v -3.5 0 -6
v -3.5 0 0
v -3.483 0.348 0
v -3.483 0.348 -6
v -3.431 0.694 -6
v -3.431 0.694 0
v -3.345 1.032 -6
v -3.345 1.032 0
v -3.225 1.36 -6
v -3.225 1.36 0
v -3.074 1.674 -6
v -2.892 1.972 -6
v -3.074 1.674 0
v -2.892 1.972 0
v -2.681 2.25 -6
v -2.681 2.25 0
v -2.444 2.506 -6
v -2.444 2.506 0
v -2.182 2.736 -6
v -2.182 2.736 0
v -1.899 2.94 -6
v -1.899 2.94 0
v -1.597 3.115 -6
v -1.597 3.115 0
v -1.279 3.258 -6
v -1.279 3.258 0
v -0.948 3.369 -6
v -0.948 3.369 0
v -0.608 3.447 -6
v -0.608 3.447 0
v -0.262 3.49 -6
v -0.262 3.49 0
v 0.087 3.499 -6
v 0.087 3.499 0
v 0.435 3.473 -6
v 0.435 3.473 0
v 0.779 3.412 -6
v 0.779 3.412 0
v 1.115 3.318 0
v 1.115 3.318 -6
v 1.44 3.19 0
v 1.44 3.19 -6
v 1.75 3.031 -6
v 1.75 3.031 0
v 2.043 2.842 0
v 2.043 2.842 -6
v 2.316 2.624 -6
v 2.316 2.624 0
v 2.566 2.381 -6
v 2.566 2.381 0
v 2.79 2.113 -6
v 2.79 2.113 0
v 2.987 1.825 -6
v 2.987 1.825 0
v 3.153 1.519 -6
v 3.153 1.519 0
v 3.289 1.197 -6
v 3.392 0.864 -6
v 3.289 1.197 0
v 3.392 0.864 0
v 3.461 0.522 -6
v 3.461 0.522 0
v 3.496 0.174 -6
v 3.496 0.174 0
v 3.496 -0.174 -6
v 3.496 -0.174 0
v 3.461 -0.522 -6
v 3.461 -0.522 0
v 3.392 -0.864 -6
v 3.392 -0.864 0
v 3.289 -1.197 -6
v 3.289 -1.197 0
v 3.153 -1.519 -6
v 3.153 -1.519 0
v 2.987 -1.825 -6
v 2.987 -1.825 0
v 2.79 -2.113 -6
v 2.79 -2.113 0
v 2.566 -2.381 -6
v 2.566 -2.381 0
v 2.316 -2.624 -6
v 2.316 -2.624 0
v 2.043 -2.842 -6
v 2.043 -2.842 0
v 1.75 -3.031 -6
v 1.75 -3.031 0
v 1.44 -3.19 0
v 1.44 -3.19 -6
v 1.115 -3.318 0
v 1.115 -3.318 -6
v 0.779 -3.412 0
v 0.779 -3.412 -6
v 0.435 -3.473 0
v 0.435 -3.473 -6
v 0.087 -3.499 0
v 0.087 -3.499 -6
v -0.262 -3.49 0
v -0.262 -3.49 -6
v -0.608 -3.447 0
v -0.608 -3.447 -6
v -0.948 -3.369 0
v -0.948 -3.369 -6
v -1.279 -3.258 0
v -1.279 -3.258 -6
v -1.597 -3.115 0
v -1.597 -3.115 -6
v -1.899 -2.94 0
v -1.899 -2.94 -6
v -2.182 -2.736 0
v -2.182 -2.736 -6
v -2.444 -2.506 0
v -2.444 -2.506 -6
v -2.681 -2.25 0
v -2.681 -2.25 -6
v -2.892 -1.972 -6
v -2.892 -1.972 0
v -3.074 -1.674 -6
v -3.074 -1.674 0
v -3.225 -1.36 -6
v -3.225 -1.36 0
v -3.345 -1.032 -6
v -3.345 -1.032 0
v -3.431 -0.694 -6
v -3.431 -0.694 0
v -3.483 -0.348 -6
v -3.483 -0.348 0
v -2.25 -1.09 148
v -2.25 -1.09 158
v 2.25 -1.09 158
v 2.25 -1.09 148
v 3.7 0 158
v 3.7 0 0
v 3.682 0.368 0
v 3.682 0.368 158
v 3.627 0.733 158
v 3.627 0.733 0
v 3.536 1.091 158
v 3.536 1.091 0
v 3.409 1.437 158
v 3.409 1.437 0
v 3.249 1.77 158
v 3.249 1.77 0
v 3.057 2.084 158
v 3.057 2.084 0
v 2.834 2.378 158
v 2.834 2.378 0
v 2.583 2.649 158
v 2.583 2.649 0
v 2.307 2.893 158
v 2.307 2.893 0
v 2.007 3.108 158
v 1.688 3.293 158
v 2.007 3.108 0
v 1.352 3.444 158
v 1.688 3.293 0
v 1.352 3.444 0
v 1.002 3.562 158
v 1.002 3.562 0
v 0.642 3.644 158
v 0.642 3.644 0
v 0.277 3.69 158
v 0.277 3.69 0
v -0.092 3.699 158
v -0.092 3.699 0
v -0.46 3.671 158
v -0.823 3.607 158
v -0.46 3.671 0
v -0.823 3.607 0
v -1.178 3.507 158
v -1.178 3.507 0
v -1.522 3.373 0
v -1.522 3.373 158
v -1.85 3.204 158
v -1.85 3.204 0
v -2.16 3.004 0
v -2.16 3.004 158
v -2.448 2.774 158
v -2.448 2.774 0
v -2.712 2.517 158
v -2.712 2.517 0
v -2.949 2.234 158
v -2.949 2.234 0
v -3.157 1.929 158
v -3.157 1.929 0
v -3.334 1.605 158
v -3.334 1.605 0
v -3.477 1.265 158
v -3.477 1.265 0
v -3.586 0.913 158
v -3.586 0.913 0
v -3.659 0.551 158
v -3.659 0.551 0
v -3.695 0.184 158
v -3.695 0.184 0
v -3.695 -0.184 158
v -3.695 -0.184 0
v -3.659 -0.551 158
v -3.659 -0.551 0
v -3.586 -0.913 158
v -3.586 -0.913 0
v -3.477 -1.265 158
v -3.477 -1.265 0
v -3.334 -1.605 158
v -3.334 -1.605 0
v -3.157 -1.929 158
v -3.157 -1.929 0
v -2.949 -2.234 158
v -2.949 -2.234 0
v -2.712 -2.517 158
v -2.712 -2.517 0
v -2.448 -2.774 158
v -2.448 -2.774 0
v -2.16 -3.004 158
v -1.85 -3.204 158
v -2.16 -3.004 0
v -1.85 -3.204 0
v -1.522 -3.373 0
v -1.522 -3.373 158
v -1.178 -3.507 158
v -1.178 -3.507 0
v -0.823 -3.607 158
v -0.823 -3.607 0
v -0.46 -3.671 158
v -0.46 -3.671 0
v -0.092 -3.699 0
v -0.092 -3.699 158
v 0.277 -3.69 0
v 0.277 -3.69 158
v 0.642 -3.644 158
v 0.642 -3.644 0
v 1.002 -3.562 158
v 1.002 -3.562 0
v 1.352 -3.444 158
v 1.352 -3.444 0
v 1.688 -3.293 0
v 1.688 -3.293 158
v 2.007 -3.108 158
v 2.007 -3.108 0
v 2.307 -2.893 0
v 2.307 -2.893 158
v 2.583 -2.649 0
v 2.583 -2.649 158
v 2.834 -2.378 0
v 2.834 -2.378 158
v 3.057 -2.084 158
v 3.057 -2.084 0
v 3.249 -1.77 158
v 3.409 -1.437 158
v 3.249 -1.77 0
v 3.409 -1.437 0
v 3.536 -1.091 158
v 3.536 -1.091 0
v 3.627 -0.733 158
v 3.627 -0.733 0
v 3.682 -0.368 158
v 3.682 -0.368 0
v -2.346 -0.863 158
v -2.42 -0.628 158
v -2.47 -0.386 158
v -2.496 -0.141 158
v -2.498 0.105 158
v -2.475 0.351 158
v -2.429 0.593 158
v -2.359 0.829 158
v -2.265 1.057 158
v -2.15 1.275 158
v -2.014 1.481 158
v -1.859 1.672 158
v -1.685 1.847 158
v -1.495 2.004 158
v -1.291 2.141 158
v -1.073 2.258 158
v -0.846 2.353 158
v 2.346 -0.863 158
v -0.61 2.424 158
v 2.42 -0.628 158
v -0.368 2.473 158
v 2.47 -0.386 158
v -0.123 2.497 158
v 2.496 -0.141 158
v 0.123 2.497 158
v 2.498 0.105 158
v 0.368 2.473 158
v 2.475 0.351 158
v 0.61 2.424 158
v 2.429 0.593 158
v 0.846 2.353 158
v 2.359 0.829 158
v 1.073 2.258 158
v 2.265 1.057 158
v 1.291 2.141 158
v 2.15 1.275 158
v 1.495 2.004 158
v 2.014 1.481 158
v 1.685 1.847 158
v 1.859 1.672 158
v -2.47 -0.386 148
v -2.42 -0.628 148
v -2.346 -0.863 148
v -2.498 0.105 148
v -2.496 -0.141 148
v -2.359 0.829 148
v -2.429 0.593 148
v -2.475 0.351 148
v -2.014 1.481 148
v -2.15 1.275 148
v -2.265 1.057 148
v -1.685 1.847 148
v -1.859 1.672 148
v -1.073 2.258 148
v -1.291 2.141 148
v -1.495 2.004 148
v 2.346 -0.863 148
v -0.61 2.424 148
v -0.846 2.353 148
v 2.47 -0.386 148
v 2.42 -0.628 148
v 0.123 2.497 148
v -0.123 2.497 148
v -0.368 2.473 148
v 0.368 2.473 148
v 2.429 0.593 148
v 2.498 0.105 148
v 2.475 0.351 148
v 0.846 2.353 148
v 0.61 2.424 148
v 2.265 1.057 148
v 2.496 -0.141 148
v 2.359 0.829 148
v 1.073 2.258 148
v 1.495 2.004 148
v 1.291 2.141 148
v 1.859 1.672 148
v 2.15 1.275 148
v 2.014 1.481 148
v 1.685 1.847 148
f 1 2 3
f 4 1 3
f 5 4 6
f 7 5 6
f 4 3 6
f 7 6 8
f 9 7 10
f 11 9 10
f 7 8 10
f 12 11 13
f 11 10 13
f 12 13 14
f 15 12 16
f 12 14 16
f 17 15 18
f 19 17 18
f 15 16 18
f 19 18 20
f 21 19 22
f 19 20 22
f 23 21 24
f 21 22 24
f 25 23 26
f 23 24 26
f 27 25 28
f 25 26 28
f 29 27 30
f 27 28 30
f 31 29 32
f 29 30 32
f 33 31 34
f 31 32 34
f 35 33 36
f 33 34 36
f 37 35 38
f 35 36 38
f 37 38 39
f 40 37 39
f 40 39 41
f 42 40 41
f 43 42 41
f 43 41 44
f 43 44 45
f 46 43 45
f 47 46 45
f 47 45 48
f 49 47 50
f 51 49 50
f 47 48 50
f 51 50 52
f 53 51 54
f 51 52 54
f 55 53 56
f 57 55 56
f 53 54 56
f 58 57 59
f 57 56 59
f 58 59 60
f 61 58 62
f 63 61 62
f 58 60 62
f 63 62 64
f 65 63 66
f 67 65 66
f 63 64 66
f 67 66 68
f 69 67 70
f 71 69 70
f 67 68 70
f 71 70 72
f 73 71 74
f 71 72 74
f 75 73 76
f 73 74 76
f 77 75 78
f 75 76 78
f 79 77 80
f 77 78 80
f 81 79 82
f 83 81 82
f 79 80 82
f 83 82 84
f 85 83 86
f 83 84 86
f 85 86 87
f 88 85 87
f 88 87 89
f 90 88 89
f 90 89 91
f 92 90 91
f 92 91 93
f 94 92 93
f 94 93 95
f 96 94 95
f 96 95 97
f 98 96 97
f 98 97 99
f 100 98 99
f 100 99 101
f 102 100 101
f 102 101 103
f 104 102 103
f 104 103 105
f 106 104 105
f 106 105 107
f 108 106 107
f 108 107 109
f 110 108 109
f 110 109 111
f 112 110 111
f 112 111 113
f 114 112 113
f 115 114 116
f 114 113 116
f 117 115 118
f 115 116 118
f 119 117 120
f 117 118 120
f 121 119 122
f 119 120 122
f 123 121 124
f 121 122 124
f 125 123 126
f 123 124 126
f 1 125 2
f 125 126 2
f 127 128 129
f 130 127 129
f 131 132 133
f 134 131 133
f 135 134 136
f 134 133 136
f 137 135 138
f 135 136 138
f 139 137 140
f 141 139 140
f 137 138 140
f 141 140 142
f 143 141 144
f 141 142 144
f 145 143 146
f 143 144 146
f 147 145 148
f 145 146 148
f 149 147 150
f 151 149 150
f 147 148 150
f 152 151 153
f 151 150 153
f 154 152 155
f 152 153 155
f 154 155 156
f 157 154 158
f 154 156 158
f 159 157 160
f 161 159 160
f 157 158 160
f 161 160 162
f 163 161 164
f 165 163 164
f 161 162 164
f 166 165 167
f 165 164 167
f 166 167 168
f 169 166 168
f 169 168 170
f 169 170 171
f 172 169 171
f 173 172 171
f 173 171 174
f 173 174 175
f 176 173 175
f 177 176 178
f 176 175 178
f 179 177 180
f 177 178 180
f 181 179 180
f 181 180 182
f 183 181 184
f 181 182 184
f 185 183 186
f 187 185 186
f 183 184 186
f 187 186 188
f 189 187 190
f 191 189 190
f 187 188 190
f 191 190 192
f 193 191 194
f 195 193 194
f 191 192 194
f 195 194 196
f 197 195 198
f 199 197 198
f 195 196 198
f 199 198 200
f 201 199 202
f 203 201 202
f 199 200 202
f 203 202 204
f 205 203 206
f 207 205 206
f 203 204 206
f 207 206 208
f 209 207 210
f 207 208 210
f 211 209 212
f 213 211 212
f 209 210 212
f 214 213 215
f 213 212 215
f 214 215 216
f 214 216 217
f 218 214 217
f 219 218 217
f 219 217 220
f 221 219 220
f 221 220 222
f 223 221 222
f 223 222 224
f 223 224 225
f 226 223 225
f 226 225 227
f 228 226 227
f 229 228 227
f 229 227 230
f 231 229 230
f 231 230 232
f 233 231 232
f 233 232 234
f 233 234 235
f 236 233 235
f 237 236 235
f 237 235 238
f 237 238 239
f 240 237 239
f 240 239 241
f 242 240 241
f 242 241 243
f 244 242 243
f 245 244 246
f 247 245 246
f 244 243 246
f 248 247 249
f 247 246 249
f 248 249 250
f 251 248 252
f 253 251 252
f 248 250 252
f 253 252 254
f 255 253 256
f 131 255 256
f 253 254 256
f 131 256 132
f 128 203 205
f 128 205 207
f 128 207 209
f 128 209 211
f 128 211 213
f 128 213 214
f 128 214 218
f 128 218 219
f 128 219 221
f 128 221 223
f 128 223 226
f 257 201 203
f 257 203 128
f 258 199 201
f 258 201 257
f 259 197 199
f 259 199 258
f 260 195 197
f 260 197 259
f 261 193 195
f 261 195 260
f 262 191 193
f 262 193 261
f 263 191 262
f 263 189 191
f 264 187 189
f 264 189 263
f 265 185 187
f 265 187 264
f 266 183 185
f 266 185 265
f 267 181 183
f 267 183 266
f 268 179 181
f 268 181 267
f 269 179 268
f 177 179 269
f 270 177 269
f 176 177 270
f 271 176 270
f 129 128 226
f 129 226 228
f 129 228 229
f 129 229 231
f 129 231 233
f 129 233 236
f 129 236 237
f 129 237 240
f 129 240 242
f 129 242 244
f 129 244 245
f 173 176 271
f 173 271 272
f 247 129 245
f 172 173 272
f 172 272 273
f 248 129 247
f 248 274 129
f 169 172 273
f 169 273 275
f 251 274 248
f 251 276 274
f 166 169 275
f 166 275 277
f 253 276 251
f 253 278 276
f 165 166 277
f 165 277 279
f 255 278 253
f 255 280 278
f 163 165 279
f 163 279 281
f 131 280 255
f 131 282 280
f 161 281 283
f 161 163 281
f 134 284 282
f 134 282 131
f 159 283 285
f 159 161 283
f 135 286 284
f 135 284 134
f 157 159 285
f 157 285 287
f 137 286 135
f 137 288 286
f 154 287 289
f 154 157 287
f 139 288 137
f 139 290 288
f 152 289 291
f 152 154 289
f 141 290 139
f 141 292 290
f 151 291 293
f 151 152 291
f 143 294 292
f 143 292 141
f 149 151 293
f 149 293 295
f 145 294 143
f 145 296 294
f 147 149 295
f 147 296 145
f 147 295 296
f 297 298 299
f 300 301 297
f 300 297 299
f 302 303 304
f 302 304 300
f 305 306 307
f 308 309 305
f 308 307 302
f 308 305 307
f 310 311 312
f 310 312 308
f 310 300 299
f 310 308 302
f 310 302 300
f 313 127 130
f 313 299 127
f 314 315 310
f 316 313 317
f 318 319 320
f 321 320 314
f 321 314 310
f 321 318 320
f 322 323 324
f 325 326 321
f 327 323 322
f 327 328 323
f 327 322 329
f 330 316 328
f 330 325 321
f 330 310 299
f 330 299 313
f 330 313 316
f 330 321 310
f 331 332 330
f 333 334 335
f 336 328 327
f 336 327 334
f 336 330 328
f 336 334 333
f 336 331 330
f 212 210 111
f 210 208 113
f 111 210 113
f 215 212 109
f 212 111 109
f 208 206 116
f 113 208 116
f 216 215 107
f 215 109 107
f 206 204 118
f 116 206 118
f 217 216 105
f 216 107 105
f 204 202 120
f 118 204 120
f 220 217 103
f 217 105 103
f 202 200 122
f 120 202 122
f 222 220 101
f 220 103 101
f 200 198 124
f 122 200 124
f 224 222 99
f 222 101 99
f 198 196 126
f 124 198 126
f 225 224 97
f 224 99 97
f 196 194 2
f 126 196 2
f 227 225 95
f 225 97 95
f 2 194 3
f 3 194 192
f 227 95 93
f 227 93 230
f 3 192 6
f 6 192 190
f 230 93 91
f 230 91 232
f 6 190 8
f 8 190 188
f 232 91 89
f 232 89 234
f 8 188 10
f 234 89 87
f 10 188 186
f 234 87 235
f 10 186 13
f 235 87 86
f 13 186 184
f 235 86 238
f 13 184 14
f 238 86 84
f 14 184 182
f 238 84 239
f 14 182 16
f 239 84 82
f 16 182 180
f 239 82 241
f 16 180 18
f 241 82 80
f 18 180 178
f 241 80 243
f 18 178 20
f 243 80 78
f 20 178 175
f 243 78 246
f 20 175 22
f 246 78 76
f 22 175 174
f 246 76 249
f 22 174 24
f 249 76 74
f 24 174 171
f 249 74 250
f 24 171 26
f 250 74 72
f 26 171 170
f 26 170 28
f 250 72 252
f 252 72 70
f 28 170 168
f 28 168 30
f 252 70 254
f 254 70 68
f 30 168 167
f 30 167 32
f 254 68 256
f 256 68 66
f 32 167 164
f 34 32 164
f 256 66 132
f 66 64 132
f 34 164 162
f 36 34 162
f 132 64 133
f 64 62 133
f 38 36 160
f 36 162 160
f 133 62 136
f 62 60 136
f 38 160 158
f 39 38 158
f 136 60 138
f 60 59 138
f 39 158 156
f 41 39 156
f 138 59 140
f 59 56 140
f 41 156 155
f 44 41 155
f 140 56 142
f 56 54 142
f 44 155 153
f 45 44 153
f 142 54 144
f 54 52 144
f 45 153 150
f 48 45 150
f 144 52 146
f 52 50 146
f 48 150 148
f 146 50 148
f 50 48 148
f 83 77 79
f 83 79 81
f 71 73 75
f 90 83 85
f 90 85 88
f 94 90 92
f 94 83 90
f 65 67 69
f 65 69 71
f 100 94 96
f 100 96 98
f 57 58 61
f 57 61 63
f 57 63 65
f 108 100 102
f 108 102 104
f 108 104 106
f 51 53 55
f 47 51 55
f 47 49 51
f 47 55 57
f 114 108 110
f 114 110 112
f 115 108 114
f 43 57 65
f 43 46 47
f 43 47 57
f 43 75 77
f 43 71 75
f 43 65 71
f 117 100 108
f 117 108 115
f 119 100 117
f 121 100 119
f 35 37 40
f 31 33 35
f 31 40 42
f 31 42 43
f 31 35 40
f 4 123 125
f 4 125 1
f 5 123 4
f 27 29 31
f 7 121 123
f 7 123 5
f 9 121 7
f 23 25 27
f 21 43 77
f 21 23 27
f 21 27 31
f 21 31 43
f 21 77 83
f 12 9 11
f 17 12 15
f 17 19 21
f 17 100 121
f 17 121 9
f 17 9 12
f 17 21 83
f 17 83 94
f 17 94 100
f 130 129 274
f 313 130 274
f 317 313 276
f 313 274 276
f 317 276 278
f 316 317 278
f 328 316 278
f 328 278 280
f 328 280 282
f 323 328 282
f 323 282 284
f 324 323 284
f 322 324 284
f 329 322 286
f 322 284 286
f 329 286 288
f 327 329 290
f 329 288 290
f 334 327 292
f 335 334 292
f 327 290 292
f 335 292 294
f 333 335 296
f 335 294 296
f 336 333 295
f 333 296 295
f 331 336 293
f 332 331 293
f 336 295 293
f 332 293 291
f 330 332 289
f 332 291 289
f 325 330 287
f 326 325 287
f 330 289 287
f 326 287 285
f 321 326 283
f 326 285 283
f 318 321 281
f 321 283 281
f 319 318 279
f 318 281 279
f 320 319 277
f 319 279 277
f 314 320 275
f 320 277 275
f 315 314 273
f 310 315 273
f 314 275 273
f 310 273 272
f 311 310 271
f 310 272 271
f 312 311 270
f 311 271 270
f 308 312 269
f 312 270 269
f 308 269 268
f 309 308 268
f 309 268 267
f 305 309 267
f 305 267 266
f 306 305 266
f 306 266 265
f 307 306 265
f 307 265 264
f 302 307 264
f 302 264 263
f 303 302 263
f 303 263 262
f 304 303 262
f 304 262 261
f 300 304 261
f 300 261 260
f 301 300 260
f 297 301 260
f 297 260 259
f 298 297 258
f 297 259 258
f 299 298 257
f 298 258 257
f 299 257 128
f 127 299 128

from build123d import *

# Parameters (mm, degrees)
SKETCH1_R           = 3.7
BOSS_EXTRUDE1_DEPTH = 158
SKETCH2_R           = 3.5
BOSS_EXTRUDE2_DEPTH = 6
CUT_EXTRUDE1_DEPTH  = 10


with BuildPart() as part:
    # Sketch1 → Boss-Extrude1 (new body)
    with BuildSketch(Plane.XY):
        Circle(SKETCH1_R)
    extrude(amount=BOSS_EXTRUDE1_DEPTH)

    # Sketch2 → Boss-Extrude2 (add)
    with BuildSketch(Plane(origin=(0, 0, 0), x_dir=(-1, 0, 0), z_dir=(0, 0, -1))):
        Circle(SKETCH2_R)
    extrude(amount=BOSS_EXTRUDE2_DEPTH)

    # Sketch4 → Cut-Extrude1 (cut)
    with BuildSketch(Plane.XY.offset(158)):
        with BuildLine():
            Line((-2.25, -1.089724736), (2.25, -1.089724736))
            ThreePointArc((2.25, -1.089724736), (0, 2.5), (-2.25, -1.089724736))
        make_face()
    extrude(amount=-CUT_EXTRUDE1_DEPTH, mode=Mode.SUBTRACT)


solid = part.part
